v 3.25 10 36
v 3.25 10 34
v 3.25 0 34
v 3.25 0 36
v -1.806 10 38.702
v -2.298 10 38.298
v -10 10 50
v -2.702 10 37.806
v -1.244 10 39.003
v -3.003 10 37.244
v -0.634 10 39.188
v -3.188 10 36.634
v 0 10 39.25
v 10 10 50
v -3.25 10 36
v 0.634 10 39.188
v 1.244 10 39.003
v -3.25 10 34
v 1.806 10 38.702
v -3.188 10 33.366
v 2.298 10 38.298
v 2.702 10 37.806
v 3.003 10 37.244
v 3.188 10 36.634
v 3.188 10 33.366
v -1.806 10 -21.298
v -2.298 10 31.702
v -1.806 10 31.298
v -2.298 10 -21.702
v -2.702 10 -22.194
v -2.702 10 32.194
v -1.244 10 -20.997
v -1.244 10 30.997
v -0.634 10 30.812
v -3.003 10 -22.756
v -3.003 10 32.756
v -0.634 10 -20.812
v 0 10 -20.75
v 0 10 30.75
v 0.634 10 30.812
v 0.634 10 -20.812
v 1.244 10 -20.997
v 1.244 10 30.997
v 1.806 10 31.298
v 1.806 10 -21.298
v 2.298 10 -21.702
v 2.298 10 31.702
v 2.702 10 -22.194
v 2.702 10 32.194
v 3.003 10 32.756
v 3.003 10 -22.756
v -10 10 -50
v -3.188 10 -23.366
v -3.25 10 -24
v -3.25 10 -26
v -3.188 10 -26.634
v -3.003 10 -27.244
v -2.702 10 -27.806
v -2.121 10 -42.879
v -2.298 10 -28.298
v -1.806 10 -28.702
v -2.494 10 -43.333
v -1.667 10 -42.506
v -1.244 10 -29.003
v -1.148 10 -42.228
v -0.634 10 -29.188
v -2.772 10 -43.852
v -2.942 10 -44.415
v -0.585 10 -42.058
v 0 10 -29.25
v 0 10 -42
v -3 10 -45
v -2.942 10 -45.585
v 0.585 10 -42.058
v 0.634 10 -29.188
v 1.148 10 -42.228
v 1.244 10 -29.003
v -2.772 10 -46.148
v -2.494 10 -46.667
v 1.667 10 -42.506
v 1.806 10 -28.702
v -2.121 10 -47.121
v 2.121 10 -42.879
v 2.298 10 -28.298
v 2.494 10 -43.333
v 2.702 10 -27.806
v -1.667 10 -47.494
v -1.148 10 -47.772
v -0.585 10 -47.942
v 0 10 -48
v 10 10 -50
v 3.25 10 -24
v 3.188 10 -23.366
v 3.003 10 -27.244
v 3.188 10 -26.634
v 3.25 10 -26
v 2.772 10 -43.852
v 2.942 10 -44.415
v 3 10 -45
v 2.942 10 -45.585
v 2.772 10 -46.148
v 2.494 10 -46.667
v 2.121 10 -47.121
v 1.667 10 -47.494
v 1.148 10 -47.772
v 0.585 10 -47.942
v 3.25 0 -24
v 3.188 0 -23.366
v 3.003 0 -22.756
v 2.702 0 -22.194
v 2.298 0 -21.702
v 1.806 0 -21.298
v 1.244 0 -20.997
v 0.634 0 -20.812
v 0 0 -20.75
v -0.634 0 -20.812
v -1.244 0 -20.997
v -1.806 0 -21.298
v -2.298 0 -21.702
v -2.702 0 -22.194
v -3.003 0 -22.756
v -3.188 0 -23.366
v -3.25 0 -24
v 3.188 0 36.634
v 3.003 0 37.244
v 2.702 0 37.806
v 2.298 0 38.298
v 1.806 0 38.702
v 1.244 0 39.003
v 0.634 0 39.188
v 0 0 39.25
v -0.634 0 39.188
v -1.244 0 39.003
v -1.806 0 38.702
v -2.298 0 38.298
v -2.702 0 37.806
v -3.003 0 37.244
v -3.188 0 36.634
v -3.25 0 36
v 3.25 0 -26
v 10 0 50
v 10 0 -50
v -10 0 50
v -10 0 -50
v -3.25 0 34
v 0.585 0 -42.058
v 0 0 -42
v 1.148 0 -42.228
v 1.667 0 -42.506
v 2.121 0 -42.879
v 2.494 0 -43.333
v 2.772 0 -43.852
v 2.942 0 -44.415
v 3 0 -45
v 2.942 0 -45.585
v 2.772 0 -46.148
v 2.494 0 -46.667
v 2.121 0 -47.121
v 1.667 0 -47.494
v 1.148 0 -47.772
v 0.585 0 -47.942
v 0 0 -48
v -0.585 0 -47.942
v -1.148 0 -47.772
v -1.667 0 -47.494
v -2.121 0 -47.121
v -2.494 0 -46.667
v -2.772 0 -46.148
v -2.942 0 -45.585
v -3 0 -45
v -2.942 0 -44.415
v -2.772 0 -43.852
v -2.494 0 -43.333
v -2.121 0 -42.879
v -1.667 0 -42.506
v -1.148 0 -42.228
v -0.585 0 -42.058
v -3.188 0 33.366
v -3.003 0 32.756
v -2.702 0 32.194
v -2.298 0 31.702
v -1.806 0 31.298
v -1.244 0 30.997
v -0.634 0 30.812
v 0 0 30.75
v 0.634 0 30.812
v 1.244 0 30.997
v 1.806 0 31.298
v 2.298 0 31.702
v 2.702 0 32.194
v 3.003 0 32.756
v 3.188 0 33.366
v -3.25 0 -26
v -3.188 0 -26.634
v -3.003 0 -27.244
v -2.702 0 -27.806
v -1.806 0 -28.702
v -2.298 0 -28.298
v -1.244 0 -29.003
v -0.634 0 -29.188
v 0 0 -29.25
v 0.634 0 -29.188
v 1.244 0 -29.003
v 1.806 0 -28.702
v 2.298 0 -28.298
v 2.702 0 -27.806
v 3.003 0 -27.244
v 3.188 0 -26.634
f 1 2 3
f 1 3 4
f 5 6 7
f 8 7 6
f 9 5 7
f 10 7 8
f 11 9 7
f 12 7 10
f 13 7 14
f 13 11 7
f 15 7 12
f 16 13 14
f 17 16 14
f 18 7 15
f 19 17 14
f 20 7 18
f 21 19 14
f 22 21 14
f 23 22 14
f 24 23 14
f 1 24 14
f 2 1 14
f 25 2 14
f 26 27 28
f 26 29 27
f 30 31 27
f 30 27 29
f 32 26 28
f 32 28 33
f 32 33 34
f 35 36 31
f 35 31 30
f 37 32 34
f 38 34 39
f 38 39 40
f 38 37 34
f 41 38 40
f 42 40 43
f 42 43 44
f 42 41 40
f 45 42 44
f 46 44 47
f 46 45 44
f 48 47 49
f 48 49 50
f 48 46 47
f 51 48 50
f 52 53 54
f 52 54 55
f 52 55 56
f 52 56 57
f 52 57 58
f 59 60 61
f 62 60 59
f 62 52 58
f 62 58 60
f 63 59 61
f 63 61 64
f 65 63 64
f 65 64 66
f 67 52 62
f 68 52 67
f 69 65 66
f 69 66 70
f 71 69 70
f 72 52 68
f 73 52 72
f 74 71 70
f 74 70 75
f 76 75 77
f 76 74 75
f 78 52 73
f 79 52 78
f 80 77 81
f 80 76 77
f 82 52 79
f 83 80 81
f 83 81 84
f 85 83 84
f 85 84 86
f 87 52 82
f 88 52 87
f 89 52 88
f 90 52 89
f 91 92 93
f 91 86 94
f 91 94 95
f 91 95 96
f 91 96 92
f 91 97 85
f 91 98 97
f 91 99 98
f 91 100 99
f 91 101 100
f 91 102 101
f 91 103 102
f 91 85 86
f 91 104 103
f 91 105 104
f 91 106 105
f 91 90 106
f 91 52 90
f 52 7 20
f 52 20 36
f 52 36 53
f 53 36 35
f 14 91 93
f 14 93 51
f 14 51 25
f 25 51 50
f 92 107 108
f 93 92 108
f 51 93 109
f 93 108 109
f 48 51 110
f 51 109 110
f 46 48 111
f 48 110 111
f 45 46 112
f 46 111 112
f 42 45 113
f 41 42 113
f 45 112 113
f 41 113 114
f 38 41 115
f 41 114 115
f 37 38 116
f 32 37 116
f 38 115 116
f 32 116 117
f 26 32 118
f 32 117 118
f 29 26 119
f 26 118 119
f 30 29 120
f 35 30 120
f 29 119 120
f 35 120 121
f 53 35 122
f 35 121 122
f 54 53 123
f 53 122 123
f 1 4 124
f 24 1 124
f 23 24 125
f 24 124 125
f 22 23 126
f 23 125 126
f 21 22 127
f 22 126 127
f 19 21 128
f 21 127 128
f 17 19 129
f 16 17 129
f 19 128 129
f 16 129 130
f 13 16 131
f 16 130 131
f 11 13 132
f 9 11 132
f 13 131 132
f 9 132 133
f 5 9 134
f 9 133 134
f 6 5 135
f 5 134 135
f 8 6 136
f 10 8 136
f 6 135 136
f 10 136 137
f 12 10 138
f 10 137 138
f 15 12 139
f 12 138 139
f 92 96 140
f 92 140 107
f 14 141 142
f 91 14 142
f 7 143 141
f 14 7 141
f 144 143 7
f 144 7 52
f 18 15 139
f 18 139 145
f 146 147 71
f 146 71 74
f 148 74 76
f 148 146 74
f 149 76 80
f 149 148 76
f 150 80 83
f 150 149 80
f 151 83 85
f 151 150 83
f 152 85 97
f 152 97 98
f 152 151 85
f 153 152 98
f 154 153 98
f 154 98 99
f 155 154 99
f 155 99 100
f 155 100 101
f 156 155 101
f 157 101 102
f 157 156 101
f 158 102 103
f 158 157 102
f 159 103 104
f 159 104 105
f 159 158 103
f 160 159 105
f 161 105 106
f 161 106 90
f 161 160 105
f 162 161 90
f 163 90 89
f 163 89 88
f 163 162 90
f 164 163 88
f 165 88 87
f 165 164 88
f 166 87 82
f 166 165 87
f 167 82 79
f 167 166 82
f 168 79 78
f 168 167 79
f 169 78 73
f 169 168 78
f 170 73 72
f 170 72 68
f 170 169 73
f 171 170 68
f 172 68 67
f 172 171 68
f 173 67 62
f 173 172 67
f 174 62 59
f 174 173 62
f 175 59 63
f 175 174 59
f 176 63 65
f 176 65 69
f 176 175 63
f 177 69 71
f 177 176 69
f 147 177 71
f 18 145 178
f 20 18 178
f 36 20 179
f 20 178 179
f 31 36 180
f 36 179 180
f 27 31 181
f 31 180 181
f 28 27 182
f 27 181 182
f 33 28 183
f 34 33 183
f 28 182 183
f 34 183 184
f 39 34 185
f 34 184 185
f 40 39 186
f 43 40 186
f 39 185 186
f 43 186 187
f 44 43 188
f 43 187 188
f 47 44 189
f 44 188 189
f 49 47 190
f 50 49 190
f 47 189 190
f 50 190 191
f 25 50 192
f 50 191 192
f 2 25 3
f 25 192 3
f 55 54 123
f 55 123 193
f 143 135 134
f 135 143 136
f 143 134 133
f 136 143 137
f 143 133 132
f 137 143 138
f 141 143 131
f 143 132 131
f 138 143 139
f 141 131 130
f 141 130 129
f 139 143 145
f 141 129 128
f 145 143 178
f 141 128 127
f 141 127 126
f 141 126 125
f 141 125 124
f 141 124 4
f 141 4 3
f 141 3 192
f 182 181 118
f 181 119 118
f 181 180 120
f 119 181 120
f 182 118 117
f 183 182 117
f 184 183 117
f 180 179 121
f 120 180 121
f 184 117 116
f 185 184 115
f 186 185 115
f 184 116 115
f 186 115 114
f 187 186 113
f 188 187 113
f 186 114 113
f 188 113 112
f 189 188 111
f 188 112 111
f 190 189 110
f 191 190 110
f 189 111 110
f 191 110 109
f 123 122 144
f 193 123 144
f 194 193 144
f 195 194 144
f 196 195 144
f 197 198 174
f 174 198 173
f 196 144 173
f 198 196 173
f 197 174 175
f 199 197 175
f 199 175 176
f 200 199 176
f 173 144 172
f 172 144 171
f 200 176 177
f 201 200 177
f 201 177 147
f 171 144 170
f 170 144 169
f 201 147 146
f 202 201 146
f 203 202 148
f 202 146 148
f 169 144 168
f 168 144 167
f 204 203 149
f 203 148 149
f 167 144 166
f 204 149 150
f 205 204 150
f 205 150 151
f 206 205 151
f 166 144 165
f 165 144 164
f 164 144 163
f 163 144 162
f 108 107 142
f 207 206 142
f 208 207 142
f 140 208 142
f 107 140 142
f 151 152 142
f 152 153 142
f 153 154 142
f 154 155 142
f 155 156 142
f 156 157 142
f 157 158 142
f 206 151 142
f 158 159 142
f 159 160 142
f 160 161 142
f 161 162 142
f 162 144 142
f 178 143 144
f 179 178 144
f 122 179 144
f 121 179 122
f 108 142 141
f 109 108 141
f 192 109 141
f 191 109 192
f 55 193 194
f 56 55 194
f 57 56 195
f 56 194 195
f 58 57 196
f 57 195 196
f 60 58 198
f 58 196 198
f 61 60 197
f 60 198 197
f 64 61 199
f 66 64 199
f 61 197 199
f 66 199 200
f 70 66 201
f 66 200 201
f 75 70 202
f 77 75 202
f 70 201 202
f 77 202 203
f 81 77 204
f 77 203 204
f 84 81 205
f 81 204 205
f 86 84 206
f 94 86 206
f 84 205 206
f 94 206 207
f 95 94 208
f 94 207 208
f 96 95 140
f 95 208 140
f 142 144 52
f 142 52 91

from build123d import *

# Parameters (mm, degrees)
SKETCH1_W           = 20
SKETCH1_H           = 100
SKETCH1_R           = 3
BOSS_EXTRUDE1_DEPTH = 10


with BuildPart() as part:
    # Sketch1 → Boss-Extrude1 (new body)
    with BuildSketch(Plane(origin=(0, 0, 0), x_dir=(1, 0, 0), z_dir=(0, 1, 0))):
        Rectangle(SKETCH1_W, SKETCH1_H)
        with Locations(Location((0, 45, 0), (0, 0, 270))):
            Circle(SKETCH1_R, mode=Mode.SUBTRACT)
        with BuildLine():
            Line((-3.25, 24), (-3.25, 26))
            ThreePointArc((-3.25, 26), (0, 29.25), (3.25, 26))
            Line((3.25, 26), (3.25, 24))
            ThreePointArc((3.25, 24), (0, 20.75), (-3.25, 24))
        make_face(mode=Mode.SUBTRACT)
        with BuildLine():
            Line((-3.25, -36), (-3.25, -34))
            ThreePointArc((-3.25, -34), (0, -30.75), (3.25, -34))
            Line((3.25, -34), (3.25, -36))
            ThreePointArc((3.25, -36), (0, -39.25), (-3.25, -36))
        make_face(mode=Mode.SUBTRACT)
    extrude(amount=BOSS_EXTRUDE1_DEPTH)


solid = part.part
